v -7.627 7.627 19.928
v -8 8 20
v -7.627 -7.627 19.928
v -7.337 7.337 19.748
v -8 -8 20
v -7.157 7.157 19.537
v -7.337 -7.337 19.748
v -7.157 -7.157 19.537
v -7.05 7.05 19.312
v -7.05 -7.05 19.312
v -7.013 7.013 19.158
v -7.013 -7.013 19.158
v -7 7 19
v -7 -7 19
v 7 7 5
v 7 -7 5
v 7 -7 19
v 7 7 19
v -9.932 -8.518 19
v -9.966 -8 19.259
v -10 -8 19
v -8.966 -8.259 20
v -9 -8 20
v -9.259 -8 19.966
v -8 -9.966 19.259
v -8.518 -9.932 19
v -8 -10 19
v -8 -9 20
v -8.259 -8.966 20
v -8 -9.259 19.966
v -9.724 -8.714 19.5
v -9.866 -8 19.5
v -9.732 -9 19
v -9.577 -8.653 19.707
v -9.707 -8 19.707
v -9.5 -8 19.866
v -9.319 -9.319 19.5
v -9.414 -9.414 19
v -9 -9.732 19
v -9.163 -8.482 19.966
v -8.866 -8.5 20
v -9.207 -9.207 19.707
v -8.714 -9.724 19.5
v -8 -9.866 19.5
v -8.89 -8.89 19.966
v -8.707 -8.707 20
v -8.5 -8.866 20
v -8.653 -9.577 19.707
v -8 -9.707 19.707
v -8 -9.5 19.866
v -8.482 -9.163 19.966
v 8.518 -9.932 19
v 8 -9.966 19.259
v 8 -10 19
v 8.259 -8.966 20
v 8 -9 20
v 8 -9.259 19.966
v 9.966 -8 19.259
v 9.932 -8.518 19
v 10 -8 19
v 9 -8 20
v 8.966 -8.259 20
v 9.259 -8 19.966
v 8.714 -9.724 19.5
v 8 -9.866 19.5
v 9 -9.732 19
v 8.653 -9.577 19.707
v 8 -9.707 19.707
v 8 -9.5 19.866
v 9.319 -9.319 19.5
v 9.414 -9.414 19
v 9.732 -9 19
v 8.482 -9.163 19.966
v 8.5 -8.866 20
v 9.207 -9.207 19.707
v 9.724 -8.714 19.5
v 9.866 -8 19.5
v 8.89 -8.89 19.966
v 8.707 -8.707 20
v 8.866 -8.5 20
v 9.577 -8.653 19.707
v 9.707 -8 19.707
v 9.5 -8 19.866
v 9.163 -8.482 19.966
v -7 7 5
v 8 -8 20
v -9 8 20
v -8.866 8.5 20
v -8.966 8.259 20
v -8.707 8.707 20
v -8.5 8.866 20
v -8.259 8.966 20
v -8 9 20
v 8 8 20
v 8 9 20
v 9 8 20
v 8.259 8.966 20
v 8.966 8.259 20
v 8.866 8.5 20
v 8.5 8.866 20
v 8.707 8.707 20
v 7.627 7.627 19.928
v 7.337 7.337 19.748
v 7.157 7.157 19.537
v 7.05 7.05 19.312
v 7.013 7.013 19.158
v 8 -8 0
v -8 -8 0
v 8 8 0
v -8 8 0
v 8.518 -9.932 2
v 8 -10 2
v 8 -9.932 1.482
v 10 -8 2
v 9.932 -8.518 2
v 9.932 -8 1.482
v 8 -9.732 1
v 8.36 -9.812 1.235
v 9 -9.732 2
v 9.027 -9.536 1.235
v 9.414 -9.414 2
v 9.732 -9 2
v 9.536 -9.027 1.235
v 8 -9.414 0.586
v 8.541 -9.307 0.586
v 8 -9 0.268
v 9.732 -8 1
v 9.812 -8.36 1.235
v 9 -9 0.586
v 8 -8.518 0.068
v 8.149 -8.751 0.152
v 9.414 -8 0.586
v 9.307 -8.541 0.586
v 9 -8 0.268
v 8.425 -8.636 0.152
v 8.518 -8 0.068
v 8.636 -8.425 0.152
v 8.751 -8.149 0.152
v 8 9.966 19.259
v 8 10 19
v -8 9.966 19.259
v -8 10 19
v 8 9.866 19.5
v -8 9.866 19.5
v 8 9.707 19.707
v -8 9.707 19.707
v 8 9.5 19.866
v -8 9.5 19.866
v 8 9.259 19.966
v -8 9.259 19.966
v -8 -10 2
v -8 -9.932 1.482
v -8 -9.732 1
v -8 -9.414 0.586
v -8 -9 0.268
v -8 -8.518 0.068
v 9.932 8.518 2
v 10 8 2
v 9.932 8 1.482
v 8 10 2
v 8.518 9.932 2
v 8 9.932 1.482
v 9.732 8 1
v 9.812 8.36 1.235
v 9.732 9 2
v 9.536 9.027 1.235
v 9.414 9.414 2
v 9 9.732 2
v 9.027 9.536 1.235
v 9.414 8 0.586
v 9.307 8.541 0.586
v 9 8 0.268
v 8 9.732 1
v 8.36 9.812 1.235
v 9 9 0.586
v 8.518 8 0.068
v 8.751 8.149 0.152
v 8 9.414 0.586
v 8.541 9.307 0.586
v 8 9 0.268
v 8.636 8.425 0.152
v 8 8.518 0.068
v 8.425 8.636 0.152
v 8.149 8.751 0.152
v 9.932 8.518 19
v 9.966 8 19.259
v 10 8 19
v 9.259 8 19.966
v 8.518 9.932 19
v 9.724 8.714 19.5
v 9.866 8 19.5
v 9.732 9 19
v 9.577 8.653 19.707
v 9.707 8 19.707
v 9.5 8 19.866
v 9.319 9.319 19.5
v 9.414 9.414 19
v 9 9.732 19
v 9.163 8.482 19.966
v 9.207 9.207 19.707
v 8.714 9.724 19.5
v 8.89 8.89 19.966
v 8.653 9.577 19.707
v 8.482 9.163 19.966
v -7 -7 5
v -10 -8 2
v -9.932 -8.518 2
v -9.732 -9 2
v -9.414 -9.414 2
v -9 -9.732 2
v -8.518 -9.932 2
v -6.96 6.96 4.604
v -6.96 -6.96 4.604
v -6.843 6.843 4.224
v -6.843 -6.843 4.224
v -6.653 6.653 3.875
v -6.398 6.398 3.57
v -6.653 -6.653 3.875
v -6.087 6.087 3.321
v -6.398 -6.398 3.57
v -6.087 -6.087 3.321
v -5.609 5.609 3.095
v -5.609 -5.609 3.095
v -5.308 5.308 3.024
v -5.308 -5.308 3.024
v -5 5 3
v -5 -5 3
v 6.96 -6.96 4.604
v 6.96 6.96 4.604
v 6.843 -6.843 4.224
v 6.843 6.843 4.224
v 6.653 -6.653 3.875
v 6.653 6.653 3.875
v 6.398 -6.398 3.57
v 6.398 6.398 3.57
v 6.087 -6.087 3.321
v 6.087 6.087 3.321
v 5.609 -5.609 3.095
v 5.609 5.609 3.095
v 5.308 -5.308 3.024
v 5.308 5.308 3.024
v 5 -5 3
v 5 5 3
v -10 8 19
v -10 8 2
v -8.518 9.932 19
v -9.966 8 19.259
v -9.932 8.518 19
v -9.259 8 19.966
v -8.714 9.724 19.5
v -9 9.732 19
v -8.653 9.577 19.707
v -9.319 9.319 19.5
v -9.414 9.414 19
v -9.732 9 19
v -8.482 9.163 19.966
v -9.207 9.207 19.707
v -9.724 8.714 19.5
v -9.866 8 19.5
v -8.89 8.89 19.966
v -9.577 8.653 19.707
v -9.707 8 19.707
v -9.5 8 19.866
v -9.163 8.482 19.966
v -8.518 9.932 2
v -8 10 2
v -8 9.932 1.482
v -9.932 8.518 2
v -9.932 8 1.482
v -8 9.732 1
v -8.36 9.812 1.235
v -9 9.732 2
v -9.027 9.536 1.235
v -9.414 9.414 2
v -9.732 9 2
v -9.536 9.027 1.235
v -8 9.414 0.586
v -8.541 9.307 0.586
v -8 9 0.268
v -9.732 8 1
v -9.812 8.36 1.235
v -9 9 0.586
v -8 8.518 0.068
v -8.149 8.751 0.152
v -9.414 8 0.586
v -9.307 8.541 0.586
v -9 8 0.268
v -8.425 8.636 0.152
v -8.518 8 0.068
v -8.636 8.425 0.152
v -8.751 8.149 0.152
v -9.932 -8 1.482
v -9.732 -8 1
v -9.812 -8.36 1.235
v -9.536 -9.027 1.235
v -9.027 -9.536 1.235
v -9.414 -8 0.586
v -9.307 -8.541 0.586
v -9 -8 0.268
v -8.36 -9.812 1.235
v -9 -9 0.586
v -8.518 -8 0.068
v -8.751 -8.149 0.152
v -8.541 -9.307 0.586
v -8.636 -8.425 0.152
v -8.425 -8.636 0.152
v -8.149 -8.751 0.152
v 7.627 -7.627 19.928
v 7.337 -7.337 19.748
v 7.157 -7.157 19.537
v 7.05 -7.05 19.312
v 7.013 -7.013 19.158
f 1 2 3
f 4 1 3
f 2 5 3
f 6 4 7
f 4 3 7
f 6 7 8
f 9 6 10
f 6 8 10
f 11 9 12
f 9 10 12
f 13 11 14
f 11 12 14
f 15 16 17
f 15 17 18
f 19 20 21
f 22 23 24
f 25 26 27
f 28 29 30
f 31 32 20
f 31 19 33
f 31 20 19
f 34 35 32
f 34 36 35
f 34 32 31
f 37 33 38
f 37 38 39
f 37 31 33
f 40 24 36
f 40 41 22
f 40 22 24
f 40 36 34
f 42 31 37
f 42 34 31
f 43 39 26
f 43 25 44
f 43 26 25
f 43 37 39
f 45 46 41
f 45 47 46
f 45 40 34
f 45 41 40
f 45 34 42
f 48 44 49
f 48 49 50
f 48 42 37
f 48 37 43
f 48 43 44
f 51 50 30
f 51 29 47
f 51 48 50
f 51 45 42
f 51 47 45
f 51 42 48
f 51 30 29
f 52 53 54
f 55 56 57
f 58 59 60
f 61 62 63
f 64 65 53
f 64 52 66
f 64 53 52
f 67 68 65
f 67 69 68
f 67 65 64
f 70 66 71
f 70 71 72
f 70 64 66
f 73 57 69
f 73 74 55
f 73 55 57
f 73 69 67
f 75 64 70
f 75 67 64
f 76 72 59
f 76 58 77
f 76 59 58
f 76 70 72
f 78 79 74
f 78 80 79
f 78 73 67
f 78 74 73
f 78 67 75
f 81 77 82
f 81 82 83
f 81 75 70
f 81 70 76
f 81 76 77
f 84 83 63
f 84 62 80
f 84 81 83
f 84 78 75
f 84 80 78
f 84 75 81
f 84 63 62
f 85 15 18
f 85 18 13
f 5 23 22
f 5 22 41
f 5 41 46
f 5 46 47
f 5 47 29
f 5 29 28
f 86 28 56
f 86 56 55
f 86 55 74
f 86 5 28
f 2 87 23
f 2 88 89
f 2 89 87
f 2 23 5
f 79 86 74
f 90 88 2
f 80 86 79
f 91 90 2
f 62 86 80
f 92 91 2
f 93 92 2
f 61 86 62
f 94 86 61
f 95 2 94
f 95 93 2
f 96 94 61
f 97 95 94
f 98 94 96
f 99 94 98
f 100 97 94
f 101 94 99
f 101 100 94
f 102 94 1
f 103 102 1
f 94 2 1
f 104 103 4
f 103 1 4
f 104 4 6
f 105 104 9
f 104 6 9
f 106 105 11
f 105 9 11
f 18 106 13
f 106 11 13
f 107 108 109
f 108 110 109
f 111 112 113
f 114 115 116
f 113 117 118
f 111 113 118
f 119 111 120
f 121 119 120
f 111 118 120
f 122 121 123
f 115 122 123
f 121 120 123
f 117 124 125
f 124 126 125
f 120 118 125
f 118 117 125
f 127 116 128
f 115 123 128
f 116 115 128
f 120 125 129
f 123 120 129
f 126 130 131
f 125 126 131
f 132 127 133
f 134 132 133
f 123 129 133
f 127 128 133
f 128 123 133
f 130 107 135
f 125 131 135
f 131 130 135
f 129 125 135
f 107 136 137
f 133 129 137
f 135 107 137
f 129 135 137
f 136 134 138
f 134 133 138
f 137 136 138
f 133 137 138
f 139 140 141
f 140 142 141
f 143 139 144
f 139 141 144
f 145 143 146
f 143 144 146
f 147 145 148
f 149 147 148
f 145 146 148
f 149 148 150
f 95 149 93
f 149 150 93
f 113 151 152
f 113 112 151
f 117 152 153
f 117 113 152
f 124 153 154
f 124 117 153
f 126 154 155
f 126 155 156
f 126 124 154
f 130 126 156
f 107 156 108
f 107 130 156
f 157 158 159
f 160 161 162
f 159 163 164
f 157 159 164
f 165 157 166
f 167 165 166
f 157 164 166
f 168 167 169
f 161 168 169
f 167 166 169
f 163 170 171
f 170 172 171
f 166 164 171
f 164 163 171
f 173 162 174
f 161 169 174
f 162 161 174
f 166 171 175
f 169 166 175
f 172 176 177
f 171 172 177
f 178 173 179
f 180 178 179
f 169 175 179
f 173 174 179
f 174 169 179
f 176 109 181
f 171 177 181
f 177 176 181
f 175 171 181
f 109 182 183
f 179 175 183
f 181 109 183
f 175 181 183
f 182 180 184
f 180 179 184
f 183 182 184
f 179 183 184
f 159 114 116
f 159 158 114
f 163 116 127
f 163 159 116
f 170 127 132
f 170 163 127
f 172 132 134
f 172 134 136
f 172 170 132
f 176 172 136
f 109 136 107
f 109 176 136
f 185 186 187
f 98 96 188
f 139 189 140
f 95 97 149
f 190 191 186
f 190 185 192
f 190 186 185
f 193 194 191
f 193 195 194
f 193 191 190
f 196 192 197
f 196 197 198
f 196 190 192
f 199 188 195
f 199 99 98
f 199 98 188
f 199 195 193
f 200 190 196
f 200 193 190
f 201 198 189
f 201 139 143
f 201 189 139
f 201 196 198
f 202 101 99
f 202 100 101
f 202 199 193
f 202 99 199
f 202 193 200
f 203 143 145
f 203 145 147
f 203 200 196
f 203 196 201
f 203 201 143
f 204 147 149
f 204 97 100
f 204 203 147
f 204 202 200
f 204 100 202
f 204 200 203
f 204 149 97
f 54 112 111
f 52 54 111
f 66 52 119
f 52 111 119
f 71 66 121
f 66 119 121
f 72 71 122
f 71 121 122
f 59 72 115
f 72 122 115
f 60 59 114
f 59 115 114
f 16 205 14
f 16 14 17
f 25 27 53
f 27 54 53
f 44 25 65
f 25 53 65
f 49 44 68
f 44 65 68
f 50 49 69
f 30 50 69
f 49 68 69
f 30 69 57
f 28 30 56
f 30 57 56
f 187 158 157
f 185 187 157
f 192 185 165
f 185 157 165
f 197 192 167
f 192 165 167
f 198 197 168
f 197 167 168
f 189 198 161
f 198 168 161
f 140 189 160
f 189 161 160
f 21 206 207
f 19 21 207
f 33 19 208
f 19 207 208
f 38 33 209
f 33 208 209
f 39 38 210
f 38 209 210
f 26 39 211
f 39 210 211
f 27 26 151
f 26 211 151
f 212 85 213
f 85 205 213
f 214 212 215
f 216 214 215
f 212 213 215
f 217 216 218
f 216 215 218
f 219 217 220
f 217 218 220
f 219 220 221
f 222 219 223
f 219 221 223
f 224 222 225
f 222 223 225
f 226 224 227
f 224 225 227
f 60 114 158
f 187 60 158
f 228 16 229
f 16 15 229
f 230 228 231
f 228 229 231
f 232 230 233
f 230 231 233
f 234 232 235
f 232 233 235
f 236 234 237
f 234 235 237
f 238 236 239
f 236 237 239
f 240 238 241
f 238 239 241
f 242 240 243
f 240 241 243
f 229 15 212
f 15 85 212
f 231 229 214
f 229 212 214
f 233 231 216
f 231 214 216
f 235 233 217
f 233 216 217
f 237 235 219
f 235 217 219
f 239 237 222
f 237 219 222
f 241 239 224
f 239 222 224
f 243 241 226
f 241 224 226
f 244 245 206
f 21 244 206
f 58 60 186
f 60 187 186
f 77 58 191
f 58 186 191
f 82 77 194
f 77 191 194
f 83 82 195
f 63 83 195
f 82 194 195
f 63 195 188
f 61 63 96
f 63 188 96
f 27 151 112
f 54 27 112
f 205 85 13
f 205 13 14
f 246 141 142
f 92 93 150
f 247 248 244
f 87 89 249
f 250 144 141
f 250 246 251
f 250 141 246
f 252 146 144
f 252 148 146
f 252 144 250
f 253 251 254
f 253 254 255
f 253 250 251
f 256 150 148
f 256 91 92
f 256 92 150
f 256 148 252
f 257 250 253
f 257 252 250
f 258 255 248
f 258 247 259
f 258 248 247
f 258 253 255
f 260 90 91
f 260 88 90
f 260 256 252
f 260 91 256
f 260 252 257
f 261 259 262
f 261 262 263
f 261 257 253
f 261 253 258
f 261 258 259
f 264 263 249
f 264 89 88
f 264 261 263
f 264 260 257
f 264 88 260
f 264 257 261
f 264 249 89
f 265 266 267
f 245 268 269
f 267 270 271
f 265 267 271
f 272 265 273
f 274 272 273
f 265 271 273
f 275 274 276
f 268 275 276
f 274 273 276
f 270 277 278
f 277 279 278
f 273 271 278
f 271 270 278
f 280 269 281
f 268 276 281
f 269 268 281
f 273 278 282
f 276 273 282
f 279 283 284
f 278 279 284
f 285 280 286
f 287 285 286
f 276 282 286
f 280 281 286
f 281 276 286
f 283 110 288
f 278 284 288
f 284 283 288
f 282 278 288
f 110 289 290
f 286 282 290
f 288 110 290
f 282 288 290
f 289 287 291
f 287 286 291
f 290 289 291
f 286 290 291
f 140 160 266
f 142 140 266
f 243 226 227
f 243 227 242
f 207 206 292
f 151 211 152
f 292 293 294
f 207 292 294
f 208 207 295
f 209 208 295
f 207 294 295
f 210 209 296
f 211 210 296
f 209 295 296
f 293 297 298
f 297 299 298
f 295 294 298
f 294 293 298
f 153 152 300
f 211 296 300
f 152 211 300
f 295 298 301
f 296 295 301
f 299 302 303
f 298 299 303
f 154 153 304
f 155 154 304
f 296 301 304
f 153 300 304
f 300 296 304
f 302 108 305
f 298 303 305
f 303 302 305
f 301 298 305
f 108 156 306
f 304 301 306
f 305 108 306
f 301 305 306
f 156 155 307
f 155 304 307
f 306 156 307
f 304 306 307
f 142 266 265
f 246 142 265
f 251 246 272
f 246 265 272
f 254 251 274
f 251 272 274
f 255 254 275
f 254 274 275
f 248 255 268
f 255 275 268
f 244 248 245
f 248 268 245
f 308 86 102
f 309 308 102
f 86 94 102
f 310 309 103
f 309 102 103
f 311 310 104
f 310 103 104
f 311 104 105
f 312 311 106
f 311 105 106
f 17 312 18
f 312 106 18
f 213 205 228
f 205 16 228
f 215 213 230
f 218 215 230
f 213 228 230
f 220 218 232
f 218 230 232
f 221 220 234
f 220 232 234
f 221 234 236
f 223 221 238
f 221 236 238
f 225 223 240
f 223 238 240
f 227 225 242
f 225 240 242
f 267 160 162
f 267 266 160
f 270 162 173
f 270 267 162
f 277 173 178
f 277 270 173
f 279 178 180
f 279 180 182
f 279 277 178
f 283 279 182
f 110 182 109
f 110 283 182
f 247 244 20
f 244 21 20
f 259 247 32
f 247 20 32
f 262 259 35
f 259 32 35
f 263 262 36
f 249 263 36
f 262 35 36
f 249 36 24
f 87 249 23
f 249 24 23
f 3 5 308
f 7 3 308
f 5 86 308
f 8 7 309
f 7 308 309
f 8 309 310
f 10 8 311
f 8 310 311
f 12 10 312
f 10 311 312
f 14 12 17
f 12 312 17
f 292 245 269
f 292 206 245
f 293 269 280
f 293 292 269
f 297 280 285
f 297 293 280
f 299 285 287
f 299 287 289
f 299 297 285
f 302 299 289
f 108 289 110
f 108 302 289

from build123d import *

# Parameters (mm, degrees)
F1_DEPTH = 20
F2_R     = 2
F3_T     = -3
F4_R     = 1
F5_R     = 2


with BuildPart() as f1:
    # F0 (on Top) → F1 (new body)
    with BuildSketch(Plane.XY):
        with BuildLine():
            Line((8, 10), (-8, 10))
            ThreePointArc((-8, 10), (-9.4142135624, 9.4142135624), (-10, 8))
            Line((-10, 8), (-10, -8))
            ThreePointArc((-10, -8), (-9.4142135624, -9.4142135624), (-8, -10))
            Line((-8, -10), (8, -10))
            ThreePointArc((8, -10), (9.4142135624, -9.4142135624), (10, -8))
            Line((10, -8), (10, 8))
            ThreePointArc((10, 8), (9.4142135624, 9.4142135624), (8, 10))
        make_face()
    extrude(amount=F1_DEPTH)

    # F2
    f2_edges = [f1.edges().sort_by_distance(p)[0] for p in [
        (0, -10, 0),
    ]]
    fillet(f2_edges, radius=F2_R)

    # F3
    f3_openings = [f1.faces().sort_by_distance(p)[0] for p in [
        (0, 0, 20),
    ]]
    offset(amount=F3_T, openings=f3_openings)

    # F4
    f4_edges = [f1.edges().sort_by_distance(p)[0] for p in [
        (-10, 0, 20),
        (7, 0, 20),
        (0, 7, 20),
        (-7, 0, 20),
        (0, -7, 20),
        (0, 10, 20),
        (9.414214, 9.414214, 20),
        (-9.414214, 9.414214, 20),
        (10, 0, 20),
        (-9.414214, -9.414214, 20),
        (0, -10, 20),
        (9.414214, -9.414214, 20),
    ]]
    fillet(f4_edges, radius=F4_R)

    # F5
    f5_edges = [f1.edges().sort_by_distance(p)[0] for p in [
        (7, 0, 3),
        (0, -7, 3),
        (0, 7, 3),
        (-7, 0, 3),
    ]]
    fillet(f5_edges, radius=F5_R)


solid = f1.part
